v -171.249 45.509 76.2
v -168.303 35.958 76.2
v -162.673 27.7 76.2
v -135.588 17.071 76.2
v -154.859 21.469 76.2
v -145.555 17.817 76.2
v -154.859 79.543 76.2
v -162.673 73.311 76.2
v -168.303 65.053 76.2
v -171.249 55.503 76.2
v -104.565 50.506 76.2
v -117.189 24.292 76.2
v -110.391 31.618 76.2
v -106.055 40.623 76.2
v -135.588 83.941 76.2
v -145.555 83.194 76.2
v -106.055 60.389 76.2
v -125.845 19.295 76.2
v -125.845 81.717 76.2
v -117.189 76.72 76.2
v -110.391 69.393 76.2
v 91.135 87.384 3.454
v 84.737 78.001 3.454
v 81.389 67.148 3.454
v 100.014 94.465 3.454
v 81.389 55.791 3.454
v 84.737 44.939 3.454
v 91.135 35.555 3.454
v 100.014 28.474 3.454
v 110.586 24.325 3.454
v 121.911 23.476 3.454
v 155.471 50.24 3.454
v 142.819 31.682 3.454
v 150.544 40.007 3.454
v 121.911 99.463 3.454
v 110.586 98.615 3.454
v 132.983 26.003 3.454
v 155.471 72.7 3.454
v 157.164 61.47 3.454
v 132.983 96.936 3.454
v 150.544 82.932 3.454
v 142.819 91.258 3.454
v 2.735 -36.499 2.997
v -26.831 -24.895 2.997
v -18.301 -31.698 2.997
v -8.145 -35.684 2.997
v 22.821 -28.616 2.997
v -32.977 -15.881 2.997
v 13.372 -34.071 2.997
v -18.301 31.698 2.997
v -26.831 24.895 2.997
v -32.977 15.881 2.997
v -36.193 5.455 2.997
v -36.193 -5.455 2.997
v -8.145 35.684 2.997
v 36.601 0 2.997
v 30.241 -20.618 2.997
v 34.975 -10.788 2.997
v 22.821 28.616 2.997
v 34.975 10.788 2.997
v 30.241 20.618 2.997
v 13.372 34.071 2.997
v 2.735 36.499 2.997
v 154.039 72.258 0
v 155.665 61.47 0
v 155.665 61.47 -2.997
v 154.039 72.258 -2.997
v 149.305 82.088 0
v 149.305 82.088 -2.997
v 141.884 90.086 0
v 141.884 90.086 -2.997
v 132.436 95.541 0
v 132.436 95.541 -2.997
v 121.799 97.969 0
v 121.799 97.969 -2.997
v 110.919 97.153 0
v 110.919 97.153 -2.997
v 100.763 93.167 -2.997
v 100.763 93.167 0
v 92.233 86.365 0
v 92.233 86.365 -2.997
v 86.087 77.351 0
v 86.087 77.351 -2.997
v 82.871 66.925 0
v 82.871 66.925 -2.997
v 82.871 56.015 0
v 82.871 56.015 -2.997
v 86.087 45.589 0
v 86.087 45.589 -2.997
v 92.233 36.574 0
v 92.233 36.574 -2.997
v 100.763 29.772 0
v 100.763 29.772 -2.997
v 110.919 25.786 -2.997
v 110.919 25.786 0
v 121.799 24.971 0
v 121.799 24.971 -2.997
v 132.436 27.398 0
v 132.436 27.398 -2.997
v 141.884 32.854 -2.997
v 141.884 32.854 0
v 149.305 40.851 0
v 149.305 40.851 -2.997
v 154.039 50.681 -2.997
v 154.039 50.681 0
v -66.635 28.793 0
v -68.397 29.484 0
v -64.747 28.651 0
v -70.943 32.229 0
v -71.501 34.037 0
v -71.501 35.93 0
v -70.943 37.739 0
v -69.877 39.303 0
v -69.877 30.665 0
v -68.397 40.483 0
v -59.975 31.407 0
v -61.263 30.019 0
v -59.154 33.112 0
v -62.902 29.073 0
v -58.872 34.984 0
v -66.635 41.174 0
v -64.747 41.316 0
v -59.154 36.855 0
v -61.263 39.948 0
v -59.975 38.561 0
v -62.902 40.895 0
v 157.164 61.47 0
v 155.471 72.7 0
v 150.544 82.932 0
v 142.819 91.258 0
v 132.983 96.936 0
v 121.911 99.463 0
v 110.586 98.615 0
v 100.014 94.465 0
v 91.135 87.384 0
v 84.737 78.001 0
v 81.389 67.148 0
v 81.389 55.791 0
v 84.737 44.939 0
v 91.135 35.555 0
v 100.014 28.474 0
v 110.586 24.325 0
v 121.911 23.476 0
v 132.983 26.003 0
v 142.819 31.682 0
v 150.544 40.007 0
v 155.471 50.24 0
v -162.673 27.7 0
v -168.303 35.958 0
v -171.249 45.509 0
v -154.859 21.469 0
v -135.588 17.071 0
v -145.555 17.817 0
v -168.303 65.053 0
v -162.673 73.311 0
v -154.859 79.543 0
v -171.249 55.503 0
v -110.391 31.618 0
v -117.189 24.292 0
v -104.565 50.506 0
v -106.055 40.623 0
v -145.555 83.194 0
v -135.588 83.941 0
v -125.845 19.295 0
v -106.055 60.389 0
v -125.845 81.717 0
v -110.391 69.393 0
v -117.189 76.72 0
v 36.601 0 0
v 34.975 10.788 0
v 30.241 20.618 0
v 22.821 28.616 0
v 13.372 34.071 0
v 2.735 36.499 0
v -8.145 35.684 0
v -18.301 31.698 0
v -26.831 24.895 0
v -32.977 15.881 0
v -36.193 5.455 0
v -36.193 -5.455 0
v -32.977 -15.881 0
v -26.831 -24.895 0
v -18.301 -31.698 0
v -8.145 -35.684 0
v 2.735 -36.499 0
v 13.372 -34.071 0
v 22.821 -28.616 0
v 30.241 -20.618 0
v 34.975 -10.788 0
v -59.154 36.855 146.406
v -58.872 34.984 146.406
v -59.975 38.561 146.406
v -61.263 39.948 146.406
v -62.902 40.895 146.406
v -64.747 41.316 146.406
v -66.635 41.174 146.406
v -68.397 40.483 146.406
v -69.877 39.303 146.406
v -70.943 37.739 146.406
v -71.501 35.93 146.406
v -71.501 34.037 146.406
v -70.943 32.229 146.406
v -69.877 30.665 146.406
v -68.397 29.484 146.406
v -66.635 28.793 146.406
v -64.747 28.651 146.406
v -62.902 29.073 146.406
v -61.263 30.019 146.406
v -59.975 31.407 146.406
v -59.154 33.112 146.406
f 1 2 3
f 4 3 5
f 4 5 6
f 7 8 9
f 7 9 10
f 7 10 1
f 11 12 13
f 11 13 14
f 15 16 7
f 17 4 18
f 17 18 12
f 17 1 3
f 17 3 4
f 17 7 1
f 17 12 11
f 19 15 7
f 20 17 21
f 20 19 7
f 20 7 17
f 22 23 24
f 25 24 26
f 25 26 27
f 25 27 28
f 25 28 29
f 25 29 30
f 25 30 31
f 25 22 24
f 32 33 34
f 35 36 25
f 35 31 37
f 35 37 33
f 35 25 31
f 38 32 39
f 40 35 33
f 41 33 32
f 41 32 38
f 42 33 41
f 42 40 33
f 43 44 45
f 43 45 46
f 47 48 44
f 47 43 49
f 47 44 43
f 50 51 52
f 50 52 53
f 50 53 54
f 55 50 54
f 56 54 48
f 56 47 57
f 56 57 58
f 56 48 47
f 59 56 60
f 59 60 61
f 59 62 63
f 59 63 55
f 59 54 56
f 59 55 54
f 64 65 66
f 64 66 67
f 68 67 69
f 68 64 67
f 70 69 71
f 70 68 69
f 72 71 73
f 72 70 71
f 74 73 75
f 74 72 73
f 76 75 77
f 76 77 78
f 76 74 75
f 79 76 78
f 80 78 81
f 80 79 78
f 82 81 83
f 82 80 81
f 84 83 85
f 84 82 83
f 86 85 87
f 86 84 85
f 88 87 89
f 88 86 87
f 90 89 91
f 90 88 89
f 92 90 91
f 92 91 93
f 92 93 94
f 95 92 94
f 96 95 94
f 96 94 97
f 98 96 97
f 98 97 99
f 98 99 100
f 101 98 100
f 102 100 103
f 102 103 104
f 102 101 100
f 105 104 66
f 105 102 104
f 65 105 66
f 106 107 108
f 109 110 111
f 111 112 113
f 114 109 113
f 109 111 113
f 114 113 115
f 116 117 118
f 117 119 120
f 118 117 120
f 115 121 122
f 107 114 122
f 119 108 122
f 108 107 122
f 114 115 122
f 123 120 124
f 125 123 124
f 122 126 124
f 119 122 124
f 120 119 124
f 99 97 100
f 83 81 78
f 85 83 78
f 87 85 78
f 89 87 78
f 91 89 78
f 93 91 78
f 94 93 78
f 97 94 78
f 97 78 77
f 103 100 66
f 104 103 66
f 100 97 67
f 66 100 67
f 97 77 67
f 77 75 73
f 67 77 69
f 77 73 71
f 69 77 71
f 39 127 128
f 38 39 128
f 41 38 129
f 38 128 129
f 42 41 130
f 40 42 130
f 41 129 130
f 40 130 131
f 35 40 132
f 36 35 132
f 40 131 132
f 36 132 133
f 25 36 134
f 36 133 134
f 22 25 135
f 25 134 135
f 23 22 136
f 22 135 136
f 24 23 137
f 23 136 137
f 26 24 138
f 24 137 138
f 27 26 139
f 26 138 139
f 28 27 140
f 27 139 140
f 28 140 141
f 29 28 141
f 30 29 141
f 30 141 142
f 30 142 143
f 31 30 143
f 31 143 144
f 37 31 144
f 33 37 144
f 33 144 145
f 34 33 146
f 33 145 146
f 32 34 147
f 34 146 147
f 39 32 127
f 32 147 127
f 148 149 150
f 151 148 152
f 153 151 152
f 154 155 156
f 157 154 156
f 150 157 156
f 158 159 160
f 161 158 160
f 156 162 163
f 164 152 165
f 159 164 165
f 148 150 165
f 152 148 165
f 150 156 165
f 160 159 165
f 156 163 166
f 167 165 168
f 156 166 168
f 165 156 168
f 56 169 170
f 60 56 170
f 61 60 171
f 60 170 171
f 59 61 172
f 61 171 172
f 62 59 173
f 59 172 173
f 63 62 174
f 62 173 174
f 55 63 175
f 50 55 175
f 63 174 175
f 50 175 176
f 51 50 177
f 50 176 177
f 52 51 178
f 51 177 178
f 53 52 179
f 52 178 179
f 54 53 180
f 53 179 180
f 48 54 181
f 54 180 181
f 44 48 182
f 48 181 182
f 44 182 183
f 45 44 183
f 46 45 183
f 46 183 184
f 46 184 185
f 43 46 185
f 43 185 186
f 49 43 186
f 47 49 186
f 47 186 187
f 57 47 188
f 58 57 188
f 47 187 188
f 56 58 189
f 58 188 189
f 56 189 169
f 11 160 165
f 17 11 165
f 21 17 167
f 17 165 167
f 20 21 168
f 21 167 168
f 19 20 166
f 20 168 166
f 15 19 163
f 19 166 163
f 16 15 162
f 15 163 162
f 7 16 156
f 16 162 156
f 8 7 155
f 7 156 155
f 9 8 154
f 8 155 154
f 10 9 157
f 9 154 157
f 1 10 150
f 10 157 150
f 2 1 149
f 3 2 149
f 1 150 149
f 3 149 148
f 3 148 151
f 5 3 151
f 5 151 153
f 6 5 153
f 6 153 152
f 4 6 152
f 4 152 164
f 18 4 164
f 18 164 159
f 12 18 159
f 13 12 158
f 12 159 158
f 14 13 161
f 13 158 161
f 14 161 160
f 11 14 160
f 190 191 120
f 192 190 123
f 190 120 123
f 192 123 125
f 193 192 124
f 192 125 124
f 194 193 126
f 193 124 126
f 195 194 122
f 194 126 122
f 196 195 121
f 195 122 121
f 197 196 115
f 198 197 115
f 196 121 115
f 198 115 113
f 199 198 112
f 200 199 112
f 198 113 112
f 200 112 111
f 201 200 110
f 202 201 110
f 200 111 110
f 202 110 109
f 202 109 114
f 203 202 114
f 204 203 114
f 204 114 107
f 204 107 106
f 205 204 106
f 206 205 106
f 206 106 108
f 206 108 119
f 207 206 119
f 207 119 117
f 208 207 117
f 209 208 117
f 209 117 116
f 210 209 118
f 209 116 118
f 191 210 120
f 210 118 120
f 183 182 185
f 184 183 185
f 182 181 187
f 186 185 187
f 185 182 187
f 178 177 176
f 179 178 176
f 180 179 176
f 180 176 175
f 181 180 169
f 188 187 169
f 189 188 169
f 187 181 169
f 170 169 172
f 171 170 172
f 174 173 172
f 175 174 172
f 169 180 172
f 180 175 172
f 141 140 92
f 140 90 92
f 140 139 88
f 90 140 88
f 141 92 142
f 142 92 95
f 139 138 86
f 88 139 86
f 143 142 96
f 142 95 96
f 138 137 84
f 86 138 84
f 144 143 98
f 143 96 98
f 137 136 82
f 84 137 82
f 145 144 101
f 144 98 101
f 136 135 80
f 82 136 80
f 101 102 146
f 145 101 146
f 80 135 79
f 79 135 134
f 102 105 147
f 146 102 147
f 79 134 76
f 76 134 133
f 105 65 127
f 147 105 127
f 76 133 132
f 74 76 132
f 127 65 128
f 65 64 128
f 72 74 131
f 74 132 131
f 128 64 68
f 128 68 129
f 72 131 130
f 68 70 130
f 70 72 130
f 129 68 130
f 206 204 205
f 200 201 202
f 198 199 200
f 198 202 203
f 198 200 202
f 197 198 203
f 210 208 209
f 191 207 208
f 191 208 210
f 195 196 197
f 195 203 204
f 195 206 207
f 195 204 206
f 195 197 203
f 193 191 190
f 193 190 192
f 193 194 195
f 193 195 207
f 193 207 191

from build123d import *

# Parameters (mm, degrees)
F0_R      = 36.6014
F1_DEPTH  = 2.9972
F2_R      = 6.35
F3_DEPTH  = 146.4056
F4_R      = 36.6014
F5_DEPTH  = 2.9972
F4_R_2    = 38.1
F5_FACE_R = 36.6014
F6_DEPTH  = 3.4544
F7_R      = 33.528961
F8_DEPTH  = 76.2


with BuildPart() as f1:
    # F0 (on Top) → F1 (new body)
    with BuildSketch(Plane.XY):
        Circle(F0_R)
    extrude(amount=F1_DEPTH)


with BuildPart() as f3:
    # F2 (on Top) → F3 (new body)
    with BuildSketch(Plane.XY):
        with Locations((-65.221943, 34.983683)):
            Circle(F2_R)
    extrude(amount=F3_DEPTH)


with BuildPart() as f5:
    # F4 (on Top) → F5 (new body)
    with BuildSketch(Plane.XY):
        with Locations((119.06381, 61.469752)):
            Circle(F4_R)
    extrude(amount=-F5_DEPTH)

    # F4 (on Top) + F5_face (on face) → F6 (join)
    with BuildSketch(Plane.XY):
        with Locations((119.06381, 61.469752)):
            Circle(F4_R_2)
        with Locations((119.06381, 61.469752)):
            Circle(F4_R, mode=Mode.SUBTRACT)
    with BuildSketch(Plane(origin=(119.06381, 61.469752, 0), x_dir=(1, 0, 0), z_dir=(0, 0, 1))):
        Circle(F5_FACE_R)
    extrude(amount=F6_DEPTH)


with BuildPart() as f8:
    # F7 (on Top) → F8 (new body)
    with BuildSketch(Plane.XY):
        with Locations((-138.094097, 50.505746)):
            Circle(F7_R)
    extrude(amount=F8_DEPTH)


solid = Compound([f1.part, f3.part, f5.part, f8.part])
